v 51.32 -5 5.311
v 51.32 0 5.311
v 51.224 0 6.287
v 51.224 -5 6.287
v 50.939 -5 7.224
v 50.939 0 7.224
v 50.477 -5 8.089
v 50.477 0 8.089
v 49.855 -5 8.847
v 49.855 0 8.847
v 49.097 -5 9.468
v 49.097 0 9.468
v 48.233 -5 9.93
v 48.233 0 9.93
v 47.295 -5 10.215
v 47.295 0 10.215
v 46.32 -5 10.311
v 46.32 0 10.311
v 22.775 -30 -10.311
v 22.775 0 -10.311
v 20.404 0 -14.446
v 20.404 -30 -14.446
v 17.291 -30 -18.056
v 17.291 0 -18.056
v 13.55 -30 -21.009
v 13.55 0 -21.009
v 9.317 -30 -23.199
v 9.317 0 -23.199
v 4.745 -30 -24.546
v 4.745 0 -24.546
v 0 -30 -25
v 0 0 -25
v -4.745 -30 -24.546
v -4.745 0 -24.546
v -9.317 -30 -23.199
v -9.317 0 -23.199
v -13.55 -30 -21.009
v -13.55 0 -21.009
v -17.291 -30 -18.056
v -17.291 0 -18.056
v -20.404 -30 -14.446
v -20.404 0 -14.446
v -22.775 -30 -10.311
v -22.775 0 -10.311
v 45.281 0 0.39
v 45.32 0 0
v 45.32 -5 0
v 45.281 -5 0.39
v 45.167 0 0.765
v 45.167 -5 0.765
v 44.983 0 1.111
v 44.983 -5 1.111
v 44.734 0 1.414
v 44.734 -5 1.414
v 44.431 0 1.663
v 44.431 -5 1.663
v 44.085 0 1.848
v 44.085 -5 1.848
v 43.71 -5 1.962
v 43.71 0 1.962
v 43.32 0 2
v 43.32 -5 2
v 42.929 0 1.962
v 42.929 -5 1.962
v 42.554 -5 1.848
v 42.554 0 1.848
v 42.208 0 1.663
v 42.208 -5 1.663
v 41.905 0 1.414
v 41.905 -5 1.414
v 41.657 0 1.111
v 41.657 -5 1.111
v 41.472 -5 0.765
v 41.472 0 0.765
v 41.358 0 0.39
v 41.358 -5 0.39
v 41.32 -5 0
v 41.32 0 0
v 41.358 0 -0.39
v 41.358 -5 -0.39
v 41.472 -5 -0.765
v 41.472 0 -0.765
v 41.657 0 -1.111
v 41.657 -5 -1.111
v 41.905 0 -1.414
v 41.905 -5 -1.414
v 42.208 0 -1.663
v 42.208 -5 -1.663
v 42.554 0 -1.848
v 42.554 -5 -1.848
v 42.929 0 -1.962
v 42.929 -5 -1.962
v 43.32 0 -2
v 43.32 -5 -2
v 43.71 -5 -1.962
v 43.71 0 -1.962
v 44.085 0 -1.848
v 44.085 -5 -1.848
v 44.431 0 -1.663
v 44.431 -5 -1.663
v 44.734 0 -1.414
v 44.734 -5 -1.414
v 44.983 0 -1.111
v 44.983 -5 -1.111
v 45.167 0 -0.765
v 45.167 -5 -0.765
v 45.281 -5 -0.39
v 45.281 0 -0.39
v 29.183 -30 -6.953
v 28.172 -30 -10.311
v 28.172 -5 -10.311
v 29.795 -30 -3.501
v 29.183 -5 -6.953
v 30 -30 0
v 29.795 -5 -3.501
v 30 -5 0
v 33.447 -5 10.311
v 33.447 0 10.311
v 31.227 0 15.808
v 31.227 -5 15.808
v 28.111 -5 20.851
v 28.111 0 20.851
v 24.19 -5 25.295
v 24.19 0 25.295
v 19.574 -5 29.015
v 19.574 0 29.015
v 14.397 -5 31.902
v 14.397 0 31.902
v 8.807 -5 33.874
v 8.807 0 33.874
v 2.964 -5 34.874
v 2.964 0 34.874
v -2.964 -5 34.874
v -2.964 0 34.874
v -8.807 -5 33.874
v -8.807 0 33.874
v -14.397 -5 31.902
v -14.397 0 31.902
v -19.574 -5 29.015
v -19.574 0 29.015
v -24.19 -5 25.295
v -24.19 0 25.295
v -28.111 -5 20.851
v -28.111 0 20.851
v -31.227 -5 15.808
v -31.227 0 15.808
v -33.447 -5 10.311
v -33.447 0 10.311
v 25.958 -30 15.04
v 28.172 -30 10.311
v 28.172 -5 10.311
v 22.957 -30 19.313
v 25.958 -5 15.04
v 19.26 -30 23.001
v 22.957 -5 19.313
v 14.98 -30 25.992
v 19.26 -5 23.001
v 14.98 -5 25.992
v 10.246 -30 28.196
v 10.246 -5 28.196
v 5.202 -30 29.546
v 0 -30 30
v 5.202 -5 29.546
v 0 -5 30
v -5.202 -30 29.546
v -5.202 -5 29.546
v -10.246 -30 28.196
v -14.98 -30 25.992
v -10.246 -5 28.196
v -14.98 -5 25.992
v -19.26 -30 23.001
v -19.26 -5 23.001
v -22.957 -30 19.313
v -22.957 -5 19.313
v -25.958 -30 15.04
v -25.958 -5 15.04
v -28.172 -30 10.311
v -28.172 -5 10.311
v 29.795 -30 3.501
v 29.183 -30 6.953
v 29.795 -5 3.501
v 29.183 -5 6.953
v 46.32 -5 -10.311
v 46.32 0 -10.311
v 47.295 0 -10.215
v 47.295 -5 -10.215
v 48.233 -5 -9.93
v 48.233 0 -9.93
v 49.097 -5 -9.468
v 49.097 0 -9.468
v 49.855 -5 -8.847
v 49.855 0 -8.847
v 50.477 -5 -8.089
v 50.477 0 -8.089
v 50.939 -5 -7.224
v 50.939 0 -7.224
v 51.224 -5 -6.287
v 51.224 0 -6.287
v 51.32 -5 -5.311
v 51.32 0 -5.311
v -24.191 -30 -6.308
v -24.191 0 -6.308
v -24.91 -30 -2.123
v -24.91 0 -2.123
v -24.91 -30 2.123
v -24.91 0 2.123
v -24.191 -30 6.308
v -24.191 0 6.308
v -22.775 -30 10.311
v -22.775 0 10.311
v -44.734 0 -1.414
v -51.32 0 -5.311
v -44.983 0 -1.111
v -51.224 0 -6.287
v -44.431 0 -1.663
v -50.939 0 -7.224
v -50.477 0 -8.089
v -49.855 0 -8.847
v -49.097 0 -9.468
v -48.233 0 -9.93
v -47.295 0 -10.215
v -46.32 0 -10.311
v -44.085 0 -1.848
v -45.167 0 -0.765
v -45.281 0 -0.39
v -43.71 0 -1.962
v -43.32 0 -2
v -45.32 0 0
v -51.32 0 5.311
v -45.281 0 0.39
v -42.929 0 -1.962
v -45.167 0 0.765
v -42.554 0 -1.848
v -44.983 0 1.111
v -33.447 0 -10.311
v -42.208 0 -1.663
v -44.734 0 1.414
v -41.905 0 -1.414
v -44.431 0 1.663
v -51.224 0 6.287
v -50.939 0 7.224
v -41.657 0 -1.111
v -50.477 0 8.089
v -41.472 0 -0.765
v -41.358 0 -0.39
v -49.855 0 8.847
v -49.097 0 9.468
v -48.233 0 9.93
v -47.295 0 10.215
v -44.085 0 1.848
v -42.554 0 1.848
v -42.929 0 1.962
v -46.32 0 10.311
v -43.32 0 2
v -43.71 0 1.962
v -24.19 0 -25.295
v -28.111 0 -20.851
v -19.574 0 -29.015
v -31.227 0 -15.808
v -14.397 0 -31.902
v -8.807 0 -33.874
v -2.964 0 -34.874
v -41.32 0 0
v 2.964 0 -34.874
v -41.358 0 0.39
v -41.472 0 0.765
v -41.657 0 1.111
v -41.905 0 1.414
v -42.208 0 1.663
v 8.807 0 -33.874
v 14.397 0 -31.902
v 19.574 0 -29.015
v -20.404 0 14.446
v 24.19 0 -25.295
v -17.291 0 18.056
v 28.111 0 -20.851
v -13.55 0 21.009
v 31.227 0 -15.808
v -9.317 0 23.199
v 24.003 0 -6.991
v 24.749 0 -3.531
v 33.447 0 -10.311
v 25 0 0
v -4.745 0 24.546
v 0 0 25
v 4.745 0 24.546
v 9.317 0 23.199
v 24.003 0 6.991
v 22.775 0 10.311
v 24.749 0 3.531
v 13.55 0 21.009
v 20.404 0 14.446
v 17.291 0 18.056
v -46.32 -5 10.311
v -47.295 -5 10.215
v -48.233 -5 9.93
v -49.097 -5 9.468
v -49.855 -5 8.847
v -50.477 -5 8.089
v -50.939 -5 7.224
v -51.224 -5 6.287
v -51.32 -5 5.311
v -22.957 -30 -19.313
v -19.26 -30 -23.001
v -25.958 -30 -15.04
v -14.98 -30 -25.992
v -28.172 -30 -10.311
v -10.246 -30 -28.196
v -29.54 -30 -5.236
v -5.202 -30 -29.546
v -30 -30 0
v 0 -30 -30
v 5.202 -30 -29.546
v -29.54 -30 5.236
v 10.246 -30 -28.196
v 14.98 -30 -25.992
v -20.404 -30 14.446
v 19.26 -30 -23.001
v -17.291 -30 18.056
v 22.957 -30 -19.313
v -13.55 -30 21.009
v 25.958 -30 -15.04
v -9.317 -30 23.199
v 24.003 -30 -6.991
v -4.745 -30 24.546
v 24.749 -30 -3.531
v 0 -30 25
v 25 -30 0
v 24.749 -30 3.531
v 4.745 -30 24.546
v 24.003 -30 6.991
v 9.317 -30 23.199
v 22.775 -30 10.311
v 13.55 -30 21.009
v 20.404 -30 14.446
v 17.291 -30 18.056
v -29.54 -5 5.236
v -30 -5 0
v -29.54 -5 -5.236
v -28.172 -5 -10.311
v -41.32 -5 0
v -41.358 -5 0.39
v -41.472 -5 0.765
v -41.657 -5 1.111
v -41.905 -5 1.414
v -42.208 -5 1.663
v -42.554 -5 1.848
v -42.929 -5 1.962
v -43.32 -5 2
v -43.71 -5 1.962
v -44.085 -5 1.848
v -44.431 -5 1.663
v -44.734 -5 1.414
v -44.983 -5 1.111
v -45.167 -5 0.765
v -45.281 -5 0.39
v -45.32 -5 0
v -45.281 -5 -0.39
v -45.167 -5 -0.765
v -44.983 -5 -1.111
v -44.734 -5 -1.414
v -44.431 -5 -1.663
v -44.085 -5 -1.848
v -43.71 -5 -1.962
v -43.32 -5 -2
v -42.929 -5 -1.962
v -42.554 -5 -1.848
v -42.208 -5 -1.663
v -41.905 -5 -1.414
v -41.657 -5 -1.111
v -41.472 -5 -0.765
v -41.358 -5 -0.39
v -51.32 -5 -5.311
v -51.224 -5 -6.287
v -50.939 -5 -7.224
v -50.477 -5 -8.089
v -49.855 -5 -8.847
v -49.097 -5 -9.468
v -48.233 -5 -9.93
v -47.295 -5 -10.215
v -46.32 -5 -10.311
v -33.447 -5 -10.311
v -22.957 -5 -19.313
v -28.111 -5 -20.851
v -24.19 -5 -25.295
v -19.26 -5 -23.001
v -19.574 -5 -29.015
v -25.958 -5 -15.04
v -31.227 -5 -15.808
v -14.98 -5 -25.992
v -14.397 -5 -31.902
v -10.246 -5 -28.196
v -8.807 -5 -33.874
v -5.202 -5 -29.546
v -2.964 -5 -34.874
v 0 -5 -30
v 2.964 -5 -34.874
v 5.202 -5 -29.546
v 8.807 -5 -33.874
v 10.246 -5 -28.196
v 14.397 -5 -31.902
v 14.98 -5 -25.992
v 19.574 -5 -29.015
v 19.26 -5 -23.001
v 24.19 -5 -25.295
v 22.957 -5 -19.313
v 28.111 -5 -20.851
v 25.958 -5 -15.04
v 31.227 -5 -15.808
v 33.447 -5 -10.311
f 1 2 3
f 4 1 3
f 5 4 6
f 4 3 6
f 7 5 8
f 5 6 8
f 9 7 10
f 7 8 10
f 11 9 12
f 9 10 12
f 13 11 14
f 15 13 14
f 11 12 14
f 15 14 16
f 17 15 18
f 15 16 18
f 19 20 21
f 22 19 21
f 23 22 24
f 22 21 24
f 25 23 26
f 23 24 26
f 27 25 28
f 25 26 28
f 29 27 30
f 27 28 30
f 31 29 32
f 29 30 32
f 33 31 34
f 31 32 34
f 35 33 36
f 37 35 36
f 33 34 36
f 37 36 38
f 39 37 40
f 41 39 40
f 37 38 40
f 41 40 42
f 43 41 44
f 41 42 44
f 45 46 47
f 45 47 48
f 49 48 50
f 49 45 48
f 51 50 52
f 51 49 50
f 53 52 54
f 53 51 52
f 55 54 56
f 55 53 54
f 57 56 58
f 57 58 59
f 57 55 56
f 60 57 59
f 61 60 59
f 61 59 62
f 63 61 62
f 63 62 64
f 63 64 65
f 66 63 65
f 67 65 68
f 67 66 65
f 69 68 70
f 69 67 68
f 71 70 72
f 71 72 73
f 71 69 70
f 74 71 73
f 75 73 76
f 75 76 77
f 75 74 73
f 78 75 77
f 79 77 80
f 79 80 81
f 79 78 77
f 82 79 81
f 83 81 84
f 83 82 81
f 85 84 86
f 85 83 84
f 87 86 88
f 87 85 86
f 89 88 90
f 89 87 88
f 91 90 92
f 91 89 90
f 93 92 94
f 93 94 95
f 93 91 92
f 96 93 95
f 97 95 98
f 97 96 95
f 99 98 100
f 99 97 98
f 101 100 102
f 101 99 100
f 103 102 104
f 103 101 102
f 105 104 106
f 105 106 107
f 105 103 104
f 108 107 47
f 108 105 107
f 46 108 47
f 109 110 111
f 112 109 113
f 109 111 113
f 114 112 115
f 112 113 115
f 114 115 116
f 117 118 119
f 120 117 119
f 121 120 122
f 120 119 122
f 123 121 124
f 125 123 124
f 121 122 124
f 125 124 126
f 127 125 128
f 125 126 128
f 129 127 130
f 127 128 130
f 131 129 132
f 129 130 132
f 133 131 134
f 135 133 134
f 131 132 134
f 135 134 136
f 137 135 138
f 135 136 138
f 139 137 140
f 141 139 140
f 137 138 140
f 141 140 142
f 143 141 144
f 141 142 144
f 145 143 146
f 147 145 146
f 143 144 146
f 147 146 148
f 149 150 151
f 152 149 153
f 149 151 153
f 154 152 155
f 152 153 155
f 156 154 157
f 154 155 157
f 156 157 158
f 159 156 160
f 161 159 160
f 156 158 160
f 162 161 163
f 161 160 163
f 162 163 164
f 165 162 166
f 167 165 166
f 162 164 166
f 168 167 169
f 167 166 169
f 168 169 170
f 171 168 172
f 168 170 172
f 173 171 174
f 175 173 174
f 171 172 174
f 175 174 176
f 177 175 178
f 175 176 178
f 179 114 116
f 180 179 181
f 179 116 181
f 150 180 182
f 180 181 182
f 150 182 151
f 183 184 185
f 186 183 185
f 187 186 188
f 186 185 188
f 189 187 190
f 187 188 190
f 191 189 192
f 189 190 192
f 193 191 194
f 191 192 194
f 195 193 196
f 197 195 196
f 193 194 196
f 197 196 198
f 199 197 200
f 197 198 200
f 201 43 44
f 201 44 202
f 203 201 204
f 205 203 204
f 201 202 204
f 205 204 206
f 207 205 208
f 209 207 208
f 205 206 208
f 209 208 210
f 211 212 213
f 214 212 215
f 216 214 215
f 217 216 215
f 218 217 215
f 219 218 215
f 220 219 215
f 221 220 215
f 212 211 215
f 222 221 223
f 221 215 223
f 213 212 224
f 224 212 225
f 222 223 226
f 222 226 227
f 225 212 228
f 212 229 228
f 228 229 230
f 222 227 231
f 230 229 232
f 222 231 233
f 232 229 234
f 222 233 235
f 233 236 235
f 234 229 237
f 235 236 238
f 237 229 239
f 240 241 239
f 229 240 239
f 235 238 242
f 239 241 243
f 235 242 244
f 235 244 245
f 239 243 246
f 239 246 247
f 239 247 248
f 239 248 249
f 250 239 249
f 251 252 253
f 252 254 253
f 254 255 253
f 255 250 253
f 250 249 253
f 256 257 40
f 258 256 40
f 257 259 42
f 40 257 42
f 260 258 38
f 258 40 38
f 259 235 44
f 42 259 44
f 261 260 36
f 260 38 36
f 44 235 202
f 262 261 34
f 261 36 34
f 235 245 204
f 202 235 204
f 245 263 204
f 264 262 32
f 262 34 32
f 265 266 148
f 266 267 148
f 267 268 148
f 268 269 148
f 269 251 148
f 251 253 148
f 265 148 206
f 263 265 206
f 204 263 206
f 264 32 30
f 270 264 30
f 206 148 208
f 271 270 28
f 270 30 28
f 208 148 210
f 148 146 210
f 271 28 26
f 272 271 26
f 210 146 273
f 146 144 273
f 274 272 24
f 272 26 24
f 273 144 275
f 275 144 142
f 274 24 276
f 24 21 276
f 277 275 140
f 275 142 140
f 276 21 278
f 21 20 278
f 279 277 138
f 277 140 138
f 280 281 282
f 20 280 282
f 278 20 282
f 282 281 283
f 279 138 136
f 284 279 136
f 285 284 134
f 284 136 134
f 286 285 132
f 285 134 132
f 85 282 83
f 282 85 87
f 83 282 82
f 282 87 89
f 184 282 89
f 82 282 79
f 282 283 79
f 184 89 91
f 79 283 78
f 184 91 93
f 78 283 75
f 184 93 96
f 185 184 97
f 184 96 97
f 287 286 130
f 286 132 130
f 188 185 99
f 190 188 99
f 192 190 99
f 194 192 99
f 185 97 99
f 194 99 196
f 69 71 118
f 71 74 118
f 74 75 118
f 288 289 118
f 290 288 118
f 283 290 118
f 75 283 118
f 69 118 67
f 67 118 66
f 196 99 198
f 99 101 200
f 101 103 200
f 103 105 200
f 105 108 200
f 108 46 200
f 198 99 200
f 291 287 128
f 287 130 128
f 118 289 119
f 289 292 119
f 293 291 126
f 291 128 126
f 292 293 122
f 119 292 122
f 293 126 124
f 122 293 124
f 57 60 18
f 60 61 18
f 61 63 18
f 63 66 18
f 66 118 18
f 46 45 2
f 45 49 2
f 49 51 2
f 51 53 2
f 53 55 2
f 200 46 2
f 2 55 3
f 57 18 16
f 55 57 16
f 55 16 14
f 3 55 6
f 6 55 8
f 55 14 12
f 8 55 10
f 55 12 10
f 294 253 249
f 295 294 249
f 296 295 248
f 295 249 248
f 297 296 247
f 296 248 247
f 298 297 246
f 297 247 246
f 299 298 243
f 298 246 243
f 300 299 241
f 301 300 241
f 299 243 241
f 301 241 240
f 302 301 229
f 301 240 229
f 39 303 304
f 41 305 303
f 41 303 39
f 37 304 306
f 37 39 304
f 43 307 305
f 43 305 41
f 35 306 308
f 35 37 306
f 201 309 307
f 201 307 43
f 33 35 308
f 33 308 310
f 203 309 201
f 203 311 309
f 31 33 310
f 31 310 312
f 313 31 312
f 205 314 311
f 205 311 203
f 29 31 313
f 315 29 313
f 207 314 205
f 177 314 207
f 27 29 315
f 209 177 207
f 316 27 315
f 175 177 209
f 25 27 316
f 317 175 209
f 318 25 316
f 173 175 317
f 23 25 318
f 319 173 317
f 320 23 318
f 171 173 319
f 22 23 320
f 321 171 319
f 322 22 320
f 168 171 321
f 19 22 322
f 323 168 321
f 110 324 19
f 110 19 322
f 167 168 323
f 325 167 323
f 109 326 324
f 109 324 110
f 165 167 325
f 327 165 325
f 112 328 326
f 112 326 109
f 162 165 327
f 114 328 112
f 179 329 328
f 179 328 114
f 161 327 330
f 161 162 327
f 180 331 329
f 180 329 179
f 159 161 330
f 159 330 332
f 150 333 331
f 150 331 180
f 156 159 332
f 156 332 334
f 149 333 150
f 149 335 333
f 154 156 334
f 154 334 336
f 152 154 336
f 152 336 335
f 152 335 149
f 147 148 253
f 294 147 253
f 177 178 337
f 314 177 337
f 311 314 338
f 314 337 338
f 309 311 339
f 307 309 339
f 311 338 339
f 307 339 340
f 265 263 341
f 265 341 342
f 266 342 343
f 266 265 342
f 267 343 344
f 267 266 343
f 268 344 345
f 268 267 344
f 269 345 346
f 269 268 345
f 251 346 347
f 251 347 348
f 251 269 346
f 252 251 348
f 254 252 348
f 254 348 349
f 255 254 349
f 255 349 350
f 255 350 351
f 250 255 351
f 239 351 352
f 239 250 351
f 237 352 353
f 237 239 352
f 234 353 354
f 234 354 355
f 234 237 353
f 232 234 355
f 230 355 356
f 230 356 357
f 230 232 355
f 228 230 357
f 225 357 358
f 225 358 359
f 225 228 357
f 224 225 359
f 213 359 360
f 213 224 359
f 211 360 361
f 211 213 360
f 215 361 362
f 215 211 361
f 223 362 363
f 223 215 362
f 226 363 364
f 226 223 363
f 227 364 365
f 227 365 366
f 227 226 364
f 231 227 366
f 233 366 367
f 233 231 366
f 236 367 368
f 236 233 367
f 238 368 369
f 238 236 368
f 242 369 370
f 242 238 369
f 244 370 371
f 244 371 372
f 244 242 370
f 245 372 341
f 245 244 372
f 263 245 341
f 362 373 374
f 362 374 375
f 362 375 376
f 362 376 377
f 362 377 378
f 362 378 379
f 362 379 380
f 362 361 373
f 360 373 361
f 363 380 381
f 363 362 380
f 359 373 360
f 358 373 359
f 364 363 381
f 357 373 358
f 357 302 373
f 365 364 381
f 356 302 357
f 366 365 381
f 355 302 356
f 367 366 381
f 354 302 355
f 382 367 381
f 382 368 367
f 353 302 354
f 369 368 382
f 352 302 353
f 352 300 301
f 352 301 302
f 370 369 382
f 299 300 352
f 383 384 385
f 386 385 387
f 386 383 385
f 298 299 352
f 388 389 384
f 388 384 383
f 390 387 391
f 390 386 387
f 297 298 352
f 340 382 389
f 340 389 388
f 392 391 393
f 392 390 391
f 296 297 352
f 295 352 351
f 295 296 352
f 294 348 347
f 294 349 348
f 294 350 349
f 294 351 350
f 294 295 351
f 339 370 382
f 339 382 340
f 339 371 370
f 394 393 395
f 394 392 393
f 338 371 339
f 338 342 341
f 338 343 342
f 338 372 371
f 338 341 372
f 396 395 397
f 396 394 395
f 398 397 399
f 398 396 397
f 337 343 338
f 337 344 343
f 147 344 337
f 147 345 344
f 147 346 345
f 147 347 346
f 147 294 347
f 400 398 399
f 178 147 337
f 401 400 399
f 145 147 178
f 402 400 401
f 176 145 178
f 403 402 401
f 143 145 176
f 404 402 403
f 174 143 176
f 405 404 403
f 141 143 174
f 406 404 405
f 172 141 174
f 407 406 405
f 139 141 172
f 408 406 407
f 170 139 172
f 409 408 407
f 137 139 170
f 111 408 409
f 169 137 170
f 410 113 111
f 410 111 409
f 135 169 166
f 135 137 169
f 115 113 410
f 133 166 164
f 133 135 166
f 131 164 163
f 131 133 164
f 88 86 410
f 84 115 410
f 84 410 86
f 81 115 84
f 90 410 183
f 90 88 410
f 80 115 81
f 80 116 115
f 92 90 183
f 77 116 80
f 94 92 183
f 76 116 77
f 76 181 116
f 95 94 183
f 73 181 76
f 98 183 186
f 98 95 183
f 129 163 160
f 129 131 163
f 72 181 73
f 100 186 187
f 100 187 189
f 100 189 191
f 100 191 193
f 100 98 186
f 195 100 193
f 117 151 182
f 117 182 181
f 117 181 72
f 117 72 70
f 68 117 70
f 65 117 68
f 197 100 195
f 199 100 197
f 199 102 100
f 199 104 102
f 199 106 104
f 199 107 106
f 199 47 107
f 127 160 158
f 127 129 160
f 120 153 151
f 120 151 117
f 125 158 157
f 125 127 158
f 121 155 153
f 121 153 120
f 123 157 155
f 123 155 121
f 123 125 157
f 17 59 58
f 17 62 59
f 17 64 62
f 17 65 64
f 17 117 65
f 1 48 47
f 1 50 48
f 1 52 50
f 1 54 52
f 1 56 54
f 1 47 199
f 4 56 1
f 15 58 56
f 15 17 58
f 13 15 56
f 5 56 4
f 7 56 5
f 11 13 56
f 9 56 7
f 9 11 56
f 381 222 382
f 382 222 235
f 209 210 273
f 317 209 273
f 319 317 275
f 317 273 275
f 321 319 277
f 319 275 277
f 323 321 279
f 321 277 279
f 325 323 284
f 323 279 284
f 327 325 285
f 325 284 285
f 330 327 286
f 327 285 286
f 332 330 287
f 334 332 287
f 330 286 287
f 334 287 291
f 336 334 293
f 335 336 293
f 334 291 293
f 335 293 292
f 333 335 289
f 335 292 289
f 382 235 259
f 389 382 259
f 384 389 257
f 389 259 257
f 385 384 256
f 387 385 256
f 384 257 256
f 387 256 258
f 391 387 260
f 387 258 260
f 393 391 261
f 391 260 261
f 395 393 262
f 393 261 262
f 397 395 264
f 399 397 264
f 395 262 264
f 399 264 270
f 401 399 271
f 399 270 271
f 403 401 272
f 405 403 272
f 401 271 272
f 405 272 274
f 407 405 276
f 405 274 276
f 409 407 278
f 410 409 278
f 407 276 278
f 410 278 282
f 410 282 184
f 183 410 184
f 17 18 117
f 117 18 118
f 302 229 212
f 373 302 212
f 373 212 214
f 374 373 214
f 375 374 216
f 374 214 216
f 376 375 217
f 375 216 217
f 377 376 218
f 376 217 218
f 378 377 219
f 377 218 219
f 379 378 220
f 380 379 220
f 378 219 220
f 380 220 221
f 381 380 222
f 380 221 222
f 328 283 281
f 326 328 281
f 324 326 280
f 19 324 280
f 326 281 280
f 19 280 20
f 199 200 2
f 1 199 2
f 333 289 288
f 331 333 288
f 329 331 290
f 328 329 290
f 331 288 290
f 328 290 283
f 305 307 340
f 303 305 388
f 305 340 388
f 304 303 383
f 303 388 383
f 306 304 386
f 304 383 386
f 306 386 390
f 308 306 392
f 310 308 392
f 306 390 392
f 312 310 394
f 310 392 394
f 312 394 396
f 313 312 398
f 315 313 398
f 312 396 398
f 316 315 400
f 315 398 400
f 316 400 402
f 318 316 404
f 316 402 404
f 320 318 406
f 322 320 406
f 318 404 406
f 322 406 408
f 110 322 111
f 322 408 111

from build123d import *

# Parameters (mm, degrees)
F1_DEPTH = 30
F0_R     = 2
F2_DEPTH = 5


with BuildPart() as f1:
    # F0 (on Front) → F1 (new body)
    with BuildSketch(Plane.XZ):
        with BuildLine():
            ThreePointArc((-22.7745900685, 10.3110643104), (0, 25), (22.7745900685, 10.3110643104))
            Line((22.7745900685, 10.3110643104), (28.1723615053, 10.3110643104))
            ThreePointArc((28.1723615053, 10.3110643104), (0, 30), (-28.1723615053, 10.3110643104))
            Line((-28.1723615053, 10.3110643104), (-22.7745900685, 10.3110643104))
        make_face()
        with BuildLine():
            Line((28.1723615053, -10.3110643104), (22.7745900685, -10.3110643104))
            ThreePointArc((22.7745900685, -10.3110643104), (0, -25), (-22.7745900685, -10.3110643104))
            Line((-22.7745900685, -10.3110643104), (-28.1723615053, -10.3110643104))
            ThreePointArc((-28.1723615053, -10.3110643104), (0, -30), (28.1723615053, -10.3110643104))
        make_face()
        with BuildLine():
            ThreePointArc((-22.7745900685, -10.3110643104), (-25, 0), (-22.7745900685, 10.3110643104))
            Line((-22.7745900685, 10.3110643104), (-28.1723615053, 10.3110643104))
            ThreePointArc((-28.1723615053, 10.3110643104), (-30, 0), (-28.1723615053, -10.3110643104))
            Line((-28.1723615053, -10.3110643104), (-22.7745900685, -10.3110643104))
        make_face()
        with BuildLine():
            ThreePointArc((22.7745900685, 10.3110643104), (24.4373152342, 5.2742415705), (25, 0))
            ThreePointArc((25, 0), (24.4373152342, -5.2742415705), (22.7745900685, -10.3110643104))
            Line((22.7745900685, -10.3110643104), (28.1723615053, -10.3110643104))
            ThreePointArc((28.1723615053, -10.3110643104), (29.5395569124, -5.2358931826), (30, 0))
            ThreePointArc((30, 0), (29.5395569124, 5.2358931826), (28.1723615053, 10.3110643104))
            Line((28.1723615053, 10.3110643104), (22.7745900685, 10.3110643104))
        make_face()
    extrude(amount=F1_DEPTH)

    # F0 (on Front) → F2 (join)
    with BuildSketch(Plane.XZ):
        with BuildLine():
            ThreePointArc((-28.1723615053, -10.3110643104), (-30, 0), (-28.1723615053, 10.3110643104))
            Line((-28.1723615053, 10.3110643104), (-33.4467031677, 10.3110643104))
            ThreePointArc((-33.4467031677, 10.3110643104), (-35, 0), (-33.4467031677, -10.3110643104))
            Line((-33.4467031677, -10.3110643104), (-28.1723615053, -10.3110643104))
        make_face()
        with BuildLine():
            ThreePointArc((-28.1723615053, 10.3110643104), (0, 30), (28.1723615053, 10.3110643104))
            Line((28.1723615053, 10.3110643104), (33.4467031677, 10.3110643104))
            ThreePointArc((33.4467031677, 10.3110643104), (0, 35), (-33.4467031677, 10.3110643104))
            Line((-33.4467031677, 10.3110643104), (-28.1723615053, 10.3110643104))
        make_face()
        with BuildLine():
            Line((33.4467031677, 10.3110643104), (28.1723615053, 10.3110643104))
            ThreePointArc((28.1723615053, 10.3110643104), (29.5395569124, 5.2358931826), (30, 0))
            ThreePointArc((30, 0), (29.5395569124, -5.2358931826), (28.1723615053, -10.3110643104))
            Line((28.1723615053, -10.3110643104), (33.4467031677, -10.3110643104))
            ThreePointArc((33.4467031677, -10.3110643104), (34.60949733, -5.2137025774), (35, 0))
            ThreePointArc((35, 0), (34.60949733, 5.2137025774), (33.4467031677, 10.3110643104))
        make_face()
        with BuildLine():
            Line((33.4467031677, -10.3110643104), (28.1723615053, -10.3110643104))
            ThreePointArc((28.1723615053, -10.3110643104), (0, -30), (-28.1723615053, -10.3110643104))
            Line((-28.1723615053, -10.3110643104), (-33.4467031677, -10.3110643104))
            ThreePointArc((-33.4467031677, -10.3110643104), (0, -35), (33.4467031677, -10.3110643104))
        make_face()
        with BuildLine():
            ThreePointArc((-33.4467031677, -10.3110643104), (-35, 0), (-33.4467031677, 10.3110643104))
            Line((-33.4467031677, 10.3110643104), (-46.3196326792, 10.3110643104))
            ThreePointArc((-46.3196326792, 10.3110643104), (-49.8551665852, 8.8465982163), (-51.3196326792, 5.3110643104))
            Line((-51.3196326792, 5.3110643104), (-51.3196326792, -5.3110643104))
            ThreePointArc((-51.3196326792, -5.3110643104), (-49.8551665852, -8.8465982163), (-46.3196326792, -10.3110643104))
            Line((-46.3196326792, -10.3110643104), (-33.4467031677, -10.3110643104))
        make_face()
        with Locations((-43.3196326792, 0)):
            Circle(F0_R, mode=Mode.SUBTRACT)
        with BuildLine():
            Line((46.3196326792, 10.3110643104), (33.4467031677, 10.3110643104))
            ThreePointArc((33.4467031677, 10.3110643104), (34.60949733, 5.2137025774), (35, 0))
            ThreePointArc((35, 0), (34.60949733, -5.2137025774), (33.4467031677, -10.3110643104))
            Line((33.4467031677, -10.3110643104), (46.3196326792, -10.3110643104))
            ThreePointArc((46.3196326792, -10.3110643104), (49.8551665852, -8.8465982163), (51.3196326792, -5.3110643104))
            Line((51.3196326792, -5.3110643104), (51.3196326792, 5.3110643104))
            ThreePointArc((51.3196326792, 5.3110643104), (49.8551665852, 8.8465982163), (46.3196326792, 10.3110643104))
        make_face()
        with Locations((43.3196326792, 0)):
            Circle(F0_R, mode=Mode.SUBTRACT)
    extrude(amount=F2_DEPTH)


solid = f1.part
